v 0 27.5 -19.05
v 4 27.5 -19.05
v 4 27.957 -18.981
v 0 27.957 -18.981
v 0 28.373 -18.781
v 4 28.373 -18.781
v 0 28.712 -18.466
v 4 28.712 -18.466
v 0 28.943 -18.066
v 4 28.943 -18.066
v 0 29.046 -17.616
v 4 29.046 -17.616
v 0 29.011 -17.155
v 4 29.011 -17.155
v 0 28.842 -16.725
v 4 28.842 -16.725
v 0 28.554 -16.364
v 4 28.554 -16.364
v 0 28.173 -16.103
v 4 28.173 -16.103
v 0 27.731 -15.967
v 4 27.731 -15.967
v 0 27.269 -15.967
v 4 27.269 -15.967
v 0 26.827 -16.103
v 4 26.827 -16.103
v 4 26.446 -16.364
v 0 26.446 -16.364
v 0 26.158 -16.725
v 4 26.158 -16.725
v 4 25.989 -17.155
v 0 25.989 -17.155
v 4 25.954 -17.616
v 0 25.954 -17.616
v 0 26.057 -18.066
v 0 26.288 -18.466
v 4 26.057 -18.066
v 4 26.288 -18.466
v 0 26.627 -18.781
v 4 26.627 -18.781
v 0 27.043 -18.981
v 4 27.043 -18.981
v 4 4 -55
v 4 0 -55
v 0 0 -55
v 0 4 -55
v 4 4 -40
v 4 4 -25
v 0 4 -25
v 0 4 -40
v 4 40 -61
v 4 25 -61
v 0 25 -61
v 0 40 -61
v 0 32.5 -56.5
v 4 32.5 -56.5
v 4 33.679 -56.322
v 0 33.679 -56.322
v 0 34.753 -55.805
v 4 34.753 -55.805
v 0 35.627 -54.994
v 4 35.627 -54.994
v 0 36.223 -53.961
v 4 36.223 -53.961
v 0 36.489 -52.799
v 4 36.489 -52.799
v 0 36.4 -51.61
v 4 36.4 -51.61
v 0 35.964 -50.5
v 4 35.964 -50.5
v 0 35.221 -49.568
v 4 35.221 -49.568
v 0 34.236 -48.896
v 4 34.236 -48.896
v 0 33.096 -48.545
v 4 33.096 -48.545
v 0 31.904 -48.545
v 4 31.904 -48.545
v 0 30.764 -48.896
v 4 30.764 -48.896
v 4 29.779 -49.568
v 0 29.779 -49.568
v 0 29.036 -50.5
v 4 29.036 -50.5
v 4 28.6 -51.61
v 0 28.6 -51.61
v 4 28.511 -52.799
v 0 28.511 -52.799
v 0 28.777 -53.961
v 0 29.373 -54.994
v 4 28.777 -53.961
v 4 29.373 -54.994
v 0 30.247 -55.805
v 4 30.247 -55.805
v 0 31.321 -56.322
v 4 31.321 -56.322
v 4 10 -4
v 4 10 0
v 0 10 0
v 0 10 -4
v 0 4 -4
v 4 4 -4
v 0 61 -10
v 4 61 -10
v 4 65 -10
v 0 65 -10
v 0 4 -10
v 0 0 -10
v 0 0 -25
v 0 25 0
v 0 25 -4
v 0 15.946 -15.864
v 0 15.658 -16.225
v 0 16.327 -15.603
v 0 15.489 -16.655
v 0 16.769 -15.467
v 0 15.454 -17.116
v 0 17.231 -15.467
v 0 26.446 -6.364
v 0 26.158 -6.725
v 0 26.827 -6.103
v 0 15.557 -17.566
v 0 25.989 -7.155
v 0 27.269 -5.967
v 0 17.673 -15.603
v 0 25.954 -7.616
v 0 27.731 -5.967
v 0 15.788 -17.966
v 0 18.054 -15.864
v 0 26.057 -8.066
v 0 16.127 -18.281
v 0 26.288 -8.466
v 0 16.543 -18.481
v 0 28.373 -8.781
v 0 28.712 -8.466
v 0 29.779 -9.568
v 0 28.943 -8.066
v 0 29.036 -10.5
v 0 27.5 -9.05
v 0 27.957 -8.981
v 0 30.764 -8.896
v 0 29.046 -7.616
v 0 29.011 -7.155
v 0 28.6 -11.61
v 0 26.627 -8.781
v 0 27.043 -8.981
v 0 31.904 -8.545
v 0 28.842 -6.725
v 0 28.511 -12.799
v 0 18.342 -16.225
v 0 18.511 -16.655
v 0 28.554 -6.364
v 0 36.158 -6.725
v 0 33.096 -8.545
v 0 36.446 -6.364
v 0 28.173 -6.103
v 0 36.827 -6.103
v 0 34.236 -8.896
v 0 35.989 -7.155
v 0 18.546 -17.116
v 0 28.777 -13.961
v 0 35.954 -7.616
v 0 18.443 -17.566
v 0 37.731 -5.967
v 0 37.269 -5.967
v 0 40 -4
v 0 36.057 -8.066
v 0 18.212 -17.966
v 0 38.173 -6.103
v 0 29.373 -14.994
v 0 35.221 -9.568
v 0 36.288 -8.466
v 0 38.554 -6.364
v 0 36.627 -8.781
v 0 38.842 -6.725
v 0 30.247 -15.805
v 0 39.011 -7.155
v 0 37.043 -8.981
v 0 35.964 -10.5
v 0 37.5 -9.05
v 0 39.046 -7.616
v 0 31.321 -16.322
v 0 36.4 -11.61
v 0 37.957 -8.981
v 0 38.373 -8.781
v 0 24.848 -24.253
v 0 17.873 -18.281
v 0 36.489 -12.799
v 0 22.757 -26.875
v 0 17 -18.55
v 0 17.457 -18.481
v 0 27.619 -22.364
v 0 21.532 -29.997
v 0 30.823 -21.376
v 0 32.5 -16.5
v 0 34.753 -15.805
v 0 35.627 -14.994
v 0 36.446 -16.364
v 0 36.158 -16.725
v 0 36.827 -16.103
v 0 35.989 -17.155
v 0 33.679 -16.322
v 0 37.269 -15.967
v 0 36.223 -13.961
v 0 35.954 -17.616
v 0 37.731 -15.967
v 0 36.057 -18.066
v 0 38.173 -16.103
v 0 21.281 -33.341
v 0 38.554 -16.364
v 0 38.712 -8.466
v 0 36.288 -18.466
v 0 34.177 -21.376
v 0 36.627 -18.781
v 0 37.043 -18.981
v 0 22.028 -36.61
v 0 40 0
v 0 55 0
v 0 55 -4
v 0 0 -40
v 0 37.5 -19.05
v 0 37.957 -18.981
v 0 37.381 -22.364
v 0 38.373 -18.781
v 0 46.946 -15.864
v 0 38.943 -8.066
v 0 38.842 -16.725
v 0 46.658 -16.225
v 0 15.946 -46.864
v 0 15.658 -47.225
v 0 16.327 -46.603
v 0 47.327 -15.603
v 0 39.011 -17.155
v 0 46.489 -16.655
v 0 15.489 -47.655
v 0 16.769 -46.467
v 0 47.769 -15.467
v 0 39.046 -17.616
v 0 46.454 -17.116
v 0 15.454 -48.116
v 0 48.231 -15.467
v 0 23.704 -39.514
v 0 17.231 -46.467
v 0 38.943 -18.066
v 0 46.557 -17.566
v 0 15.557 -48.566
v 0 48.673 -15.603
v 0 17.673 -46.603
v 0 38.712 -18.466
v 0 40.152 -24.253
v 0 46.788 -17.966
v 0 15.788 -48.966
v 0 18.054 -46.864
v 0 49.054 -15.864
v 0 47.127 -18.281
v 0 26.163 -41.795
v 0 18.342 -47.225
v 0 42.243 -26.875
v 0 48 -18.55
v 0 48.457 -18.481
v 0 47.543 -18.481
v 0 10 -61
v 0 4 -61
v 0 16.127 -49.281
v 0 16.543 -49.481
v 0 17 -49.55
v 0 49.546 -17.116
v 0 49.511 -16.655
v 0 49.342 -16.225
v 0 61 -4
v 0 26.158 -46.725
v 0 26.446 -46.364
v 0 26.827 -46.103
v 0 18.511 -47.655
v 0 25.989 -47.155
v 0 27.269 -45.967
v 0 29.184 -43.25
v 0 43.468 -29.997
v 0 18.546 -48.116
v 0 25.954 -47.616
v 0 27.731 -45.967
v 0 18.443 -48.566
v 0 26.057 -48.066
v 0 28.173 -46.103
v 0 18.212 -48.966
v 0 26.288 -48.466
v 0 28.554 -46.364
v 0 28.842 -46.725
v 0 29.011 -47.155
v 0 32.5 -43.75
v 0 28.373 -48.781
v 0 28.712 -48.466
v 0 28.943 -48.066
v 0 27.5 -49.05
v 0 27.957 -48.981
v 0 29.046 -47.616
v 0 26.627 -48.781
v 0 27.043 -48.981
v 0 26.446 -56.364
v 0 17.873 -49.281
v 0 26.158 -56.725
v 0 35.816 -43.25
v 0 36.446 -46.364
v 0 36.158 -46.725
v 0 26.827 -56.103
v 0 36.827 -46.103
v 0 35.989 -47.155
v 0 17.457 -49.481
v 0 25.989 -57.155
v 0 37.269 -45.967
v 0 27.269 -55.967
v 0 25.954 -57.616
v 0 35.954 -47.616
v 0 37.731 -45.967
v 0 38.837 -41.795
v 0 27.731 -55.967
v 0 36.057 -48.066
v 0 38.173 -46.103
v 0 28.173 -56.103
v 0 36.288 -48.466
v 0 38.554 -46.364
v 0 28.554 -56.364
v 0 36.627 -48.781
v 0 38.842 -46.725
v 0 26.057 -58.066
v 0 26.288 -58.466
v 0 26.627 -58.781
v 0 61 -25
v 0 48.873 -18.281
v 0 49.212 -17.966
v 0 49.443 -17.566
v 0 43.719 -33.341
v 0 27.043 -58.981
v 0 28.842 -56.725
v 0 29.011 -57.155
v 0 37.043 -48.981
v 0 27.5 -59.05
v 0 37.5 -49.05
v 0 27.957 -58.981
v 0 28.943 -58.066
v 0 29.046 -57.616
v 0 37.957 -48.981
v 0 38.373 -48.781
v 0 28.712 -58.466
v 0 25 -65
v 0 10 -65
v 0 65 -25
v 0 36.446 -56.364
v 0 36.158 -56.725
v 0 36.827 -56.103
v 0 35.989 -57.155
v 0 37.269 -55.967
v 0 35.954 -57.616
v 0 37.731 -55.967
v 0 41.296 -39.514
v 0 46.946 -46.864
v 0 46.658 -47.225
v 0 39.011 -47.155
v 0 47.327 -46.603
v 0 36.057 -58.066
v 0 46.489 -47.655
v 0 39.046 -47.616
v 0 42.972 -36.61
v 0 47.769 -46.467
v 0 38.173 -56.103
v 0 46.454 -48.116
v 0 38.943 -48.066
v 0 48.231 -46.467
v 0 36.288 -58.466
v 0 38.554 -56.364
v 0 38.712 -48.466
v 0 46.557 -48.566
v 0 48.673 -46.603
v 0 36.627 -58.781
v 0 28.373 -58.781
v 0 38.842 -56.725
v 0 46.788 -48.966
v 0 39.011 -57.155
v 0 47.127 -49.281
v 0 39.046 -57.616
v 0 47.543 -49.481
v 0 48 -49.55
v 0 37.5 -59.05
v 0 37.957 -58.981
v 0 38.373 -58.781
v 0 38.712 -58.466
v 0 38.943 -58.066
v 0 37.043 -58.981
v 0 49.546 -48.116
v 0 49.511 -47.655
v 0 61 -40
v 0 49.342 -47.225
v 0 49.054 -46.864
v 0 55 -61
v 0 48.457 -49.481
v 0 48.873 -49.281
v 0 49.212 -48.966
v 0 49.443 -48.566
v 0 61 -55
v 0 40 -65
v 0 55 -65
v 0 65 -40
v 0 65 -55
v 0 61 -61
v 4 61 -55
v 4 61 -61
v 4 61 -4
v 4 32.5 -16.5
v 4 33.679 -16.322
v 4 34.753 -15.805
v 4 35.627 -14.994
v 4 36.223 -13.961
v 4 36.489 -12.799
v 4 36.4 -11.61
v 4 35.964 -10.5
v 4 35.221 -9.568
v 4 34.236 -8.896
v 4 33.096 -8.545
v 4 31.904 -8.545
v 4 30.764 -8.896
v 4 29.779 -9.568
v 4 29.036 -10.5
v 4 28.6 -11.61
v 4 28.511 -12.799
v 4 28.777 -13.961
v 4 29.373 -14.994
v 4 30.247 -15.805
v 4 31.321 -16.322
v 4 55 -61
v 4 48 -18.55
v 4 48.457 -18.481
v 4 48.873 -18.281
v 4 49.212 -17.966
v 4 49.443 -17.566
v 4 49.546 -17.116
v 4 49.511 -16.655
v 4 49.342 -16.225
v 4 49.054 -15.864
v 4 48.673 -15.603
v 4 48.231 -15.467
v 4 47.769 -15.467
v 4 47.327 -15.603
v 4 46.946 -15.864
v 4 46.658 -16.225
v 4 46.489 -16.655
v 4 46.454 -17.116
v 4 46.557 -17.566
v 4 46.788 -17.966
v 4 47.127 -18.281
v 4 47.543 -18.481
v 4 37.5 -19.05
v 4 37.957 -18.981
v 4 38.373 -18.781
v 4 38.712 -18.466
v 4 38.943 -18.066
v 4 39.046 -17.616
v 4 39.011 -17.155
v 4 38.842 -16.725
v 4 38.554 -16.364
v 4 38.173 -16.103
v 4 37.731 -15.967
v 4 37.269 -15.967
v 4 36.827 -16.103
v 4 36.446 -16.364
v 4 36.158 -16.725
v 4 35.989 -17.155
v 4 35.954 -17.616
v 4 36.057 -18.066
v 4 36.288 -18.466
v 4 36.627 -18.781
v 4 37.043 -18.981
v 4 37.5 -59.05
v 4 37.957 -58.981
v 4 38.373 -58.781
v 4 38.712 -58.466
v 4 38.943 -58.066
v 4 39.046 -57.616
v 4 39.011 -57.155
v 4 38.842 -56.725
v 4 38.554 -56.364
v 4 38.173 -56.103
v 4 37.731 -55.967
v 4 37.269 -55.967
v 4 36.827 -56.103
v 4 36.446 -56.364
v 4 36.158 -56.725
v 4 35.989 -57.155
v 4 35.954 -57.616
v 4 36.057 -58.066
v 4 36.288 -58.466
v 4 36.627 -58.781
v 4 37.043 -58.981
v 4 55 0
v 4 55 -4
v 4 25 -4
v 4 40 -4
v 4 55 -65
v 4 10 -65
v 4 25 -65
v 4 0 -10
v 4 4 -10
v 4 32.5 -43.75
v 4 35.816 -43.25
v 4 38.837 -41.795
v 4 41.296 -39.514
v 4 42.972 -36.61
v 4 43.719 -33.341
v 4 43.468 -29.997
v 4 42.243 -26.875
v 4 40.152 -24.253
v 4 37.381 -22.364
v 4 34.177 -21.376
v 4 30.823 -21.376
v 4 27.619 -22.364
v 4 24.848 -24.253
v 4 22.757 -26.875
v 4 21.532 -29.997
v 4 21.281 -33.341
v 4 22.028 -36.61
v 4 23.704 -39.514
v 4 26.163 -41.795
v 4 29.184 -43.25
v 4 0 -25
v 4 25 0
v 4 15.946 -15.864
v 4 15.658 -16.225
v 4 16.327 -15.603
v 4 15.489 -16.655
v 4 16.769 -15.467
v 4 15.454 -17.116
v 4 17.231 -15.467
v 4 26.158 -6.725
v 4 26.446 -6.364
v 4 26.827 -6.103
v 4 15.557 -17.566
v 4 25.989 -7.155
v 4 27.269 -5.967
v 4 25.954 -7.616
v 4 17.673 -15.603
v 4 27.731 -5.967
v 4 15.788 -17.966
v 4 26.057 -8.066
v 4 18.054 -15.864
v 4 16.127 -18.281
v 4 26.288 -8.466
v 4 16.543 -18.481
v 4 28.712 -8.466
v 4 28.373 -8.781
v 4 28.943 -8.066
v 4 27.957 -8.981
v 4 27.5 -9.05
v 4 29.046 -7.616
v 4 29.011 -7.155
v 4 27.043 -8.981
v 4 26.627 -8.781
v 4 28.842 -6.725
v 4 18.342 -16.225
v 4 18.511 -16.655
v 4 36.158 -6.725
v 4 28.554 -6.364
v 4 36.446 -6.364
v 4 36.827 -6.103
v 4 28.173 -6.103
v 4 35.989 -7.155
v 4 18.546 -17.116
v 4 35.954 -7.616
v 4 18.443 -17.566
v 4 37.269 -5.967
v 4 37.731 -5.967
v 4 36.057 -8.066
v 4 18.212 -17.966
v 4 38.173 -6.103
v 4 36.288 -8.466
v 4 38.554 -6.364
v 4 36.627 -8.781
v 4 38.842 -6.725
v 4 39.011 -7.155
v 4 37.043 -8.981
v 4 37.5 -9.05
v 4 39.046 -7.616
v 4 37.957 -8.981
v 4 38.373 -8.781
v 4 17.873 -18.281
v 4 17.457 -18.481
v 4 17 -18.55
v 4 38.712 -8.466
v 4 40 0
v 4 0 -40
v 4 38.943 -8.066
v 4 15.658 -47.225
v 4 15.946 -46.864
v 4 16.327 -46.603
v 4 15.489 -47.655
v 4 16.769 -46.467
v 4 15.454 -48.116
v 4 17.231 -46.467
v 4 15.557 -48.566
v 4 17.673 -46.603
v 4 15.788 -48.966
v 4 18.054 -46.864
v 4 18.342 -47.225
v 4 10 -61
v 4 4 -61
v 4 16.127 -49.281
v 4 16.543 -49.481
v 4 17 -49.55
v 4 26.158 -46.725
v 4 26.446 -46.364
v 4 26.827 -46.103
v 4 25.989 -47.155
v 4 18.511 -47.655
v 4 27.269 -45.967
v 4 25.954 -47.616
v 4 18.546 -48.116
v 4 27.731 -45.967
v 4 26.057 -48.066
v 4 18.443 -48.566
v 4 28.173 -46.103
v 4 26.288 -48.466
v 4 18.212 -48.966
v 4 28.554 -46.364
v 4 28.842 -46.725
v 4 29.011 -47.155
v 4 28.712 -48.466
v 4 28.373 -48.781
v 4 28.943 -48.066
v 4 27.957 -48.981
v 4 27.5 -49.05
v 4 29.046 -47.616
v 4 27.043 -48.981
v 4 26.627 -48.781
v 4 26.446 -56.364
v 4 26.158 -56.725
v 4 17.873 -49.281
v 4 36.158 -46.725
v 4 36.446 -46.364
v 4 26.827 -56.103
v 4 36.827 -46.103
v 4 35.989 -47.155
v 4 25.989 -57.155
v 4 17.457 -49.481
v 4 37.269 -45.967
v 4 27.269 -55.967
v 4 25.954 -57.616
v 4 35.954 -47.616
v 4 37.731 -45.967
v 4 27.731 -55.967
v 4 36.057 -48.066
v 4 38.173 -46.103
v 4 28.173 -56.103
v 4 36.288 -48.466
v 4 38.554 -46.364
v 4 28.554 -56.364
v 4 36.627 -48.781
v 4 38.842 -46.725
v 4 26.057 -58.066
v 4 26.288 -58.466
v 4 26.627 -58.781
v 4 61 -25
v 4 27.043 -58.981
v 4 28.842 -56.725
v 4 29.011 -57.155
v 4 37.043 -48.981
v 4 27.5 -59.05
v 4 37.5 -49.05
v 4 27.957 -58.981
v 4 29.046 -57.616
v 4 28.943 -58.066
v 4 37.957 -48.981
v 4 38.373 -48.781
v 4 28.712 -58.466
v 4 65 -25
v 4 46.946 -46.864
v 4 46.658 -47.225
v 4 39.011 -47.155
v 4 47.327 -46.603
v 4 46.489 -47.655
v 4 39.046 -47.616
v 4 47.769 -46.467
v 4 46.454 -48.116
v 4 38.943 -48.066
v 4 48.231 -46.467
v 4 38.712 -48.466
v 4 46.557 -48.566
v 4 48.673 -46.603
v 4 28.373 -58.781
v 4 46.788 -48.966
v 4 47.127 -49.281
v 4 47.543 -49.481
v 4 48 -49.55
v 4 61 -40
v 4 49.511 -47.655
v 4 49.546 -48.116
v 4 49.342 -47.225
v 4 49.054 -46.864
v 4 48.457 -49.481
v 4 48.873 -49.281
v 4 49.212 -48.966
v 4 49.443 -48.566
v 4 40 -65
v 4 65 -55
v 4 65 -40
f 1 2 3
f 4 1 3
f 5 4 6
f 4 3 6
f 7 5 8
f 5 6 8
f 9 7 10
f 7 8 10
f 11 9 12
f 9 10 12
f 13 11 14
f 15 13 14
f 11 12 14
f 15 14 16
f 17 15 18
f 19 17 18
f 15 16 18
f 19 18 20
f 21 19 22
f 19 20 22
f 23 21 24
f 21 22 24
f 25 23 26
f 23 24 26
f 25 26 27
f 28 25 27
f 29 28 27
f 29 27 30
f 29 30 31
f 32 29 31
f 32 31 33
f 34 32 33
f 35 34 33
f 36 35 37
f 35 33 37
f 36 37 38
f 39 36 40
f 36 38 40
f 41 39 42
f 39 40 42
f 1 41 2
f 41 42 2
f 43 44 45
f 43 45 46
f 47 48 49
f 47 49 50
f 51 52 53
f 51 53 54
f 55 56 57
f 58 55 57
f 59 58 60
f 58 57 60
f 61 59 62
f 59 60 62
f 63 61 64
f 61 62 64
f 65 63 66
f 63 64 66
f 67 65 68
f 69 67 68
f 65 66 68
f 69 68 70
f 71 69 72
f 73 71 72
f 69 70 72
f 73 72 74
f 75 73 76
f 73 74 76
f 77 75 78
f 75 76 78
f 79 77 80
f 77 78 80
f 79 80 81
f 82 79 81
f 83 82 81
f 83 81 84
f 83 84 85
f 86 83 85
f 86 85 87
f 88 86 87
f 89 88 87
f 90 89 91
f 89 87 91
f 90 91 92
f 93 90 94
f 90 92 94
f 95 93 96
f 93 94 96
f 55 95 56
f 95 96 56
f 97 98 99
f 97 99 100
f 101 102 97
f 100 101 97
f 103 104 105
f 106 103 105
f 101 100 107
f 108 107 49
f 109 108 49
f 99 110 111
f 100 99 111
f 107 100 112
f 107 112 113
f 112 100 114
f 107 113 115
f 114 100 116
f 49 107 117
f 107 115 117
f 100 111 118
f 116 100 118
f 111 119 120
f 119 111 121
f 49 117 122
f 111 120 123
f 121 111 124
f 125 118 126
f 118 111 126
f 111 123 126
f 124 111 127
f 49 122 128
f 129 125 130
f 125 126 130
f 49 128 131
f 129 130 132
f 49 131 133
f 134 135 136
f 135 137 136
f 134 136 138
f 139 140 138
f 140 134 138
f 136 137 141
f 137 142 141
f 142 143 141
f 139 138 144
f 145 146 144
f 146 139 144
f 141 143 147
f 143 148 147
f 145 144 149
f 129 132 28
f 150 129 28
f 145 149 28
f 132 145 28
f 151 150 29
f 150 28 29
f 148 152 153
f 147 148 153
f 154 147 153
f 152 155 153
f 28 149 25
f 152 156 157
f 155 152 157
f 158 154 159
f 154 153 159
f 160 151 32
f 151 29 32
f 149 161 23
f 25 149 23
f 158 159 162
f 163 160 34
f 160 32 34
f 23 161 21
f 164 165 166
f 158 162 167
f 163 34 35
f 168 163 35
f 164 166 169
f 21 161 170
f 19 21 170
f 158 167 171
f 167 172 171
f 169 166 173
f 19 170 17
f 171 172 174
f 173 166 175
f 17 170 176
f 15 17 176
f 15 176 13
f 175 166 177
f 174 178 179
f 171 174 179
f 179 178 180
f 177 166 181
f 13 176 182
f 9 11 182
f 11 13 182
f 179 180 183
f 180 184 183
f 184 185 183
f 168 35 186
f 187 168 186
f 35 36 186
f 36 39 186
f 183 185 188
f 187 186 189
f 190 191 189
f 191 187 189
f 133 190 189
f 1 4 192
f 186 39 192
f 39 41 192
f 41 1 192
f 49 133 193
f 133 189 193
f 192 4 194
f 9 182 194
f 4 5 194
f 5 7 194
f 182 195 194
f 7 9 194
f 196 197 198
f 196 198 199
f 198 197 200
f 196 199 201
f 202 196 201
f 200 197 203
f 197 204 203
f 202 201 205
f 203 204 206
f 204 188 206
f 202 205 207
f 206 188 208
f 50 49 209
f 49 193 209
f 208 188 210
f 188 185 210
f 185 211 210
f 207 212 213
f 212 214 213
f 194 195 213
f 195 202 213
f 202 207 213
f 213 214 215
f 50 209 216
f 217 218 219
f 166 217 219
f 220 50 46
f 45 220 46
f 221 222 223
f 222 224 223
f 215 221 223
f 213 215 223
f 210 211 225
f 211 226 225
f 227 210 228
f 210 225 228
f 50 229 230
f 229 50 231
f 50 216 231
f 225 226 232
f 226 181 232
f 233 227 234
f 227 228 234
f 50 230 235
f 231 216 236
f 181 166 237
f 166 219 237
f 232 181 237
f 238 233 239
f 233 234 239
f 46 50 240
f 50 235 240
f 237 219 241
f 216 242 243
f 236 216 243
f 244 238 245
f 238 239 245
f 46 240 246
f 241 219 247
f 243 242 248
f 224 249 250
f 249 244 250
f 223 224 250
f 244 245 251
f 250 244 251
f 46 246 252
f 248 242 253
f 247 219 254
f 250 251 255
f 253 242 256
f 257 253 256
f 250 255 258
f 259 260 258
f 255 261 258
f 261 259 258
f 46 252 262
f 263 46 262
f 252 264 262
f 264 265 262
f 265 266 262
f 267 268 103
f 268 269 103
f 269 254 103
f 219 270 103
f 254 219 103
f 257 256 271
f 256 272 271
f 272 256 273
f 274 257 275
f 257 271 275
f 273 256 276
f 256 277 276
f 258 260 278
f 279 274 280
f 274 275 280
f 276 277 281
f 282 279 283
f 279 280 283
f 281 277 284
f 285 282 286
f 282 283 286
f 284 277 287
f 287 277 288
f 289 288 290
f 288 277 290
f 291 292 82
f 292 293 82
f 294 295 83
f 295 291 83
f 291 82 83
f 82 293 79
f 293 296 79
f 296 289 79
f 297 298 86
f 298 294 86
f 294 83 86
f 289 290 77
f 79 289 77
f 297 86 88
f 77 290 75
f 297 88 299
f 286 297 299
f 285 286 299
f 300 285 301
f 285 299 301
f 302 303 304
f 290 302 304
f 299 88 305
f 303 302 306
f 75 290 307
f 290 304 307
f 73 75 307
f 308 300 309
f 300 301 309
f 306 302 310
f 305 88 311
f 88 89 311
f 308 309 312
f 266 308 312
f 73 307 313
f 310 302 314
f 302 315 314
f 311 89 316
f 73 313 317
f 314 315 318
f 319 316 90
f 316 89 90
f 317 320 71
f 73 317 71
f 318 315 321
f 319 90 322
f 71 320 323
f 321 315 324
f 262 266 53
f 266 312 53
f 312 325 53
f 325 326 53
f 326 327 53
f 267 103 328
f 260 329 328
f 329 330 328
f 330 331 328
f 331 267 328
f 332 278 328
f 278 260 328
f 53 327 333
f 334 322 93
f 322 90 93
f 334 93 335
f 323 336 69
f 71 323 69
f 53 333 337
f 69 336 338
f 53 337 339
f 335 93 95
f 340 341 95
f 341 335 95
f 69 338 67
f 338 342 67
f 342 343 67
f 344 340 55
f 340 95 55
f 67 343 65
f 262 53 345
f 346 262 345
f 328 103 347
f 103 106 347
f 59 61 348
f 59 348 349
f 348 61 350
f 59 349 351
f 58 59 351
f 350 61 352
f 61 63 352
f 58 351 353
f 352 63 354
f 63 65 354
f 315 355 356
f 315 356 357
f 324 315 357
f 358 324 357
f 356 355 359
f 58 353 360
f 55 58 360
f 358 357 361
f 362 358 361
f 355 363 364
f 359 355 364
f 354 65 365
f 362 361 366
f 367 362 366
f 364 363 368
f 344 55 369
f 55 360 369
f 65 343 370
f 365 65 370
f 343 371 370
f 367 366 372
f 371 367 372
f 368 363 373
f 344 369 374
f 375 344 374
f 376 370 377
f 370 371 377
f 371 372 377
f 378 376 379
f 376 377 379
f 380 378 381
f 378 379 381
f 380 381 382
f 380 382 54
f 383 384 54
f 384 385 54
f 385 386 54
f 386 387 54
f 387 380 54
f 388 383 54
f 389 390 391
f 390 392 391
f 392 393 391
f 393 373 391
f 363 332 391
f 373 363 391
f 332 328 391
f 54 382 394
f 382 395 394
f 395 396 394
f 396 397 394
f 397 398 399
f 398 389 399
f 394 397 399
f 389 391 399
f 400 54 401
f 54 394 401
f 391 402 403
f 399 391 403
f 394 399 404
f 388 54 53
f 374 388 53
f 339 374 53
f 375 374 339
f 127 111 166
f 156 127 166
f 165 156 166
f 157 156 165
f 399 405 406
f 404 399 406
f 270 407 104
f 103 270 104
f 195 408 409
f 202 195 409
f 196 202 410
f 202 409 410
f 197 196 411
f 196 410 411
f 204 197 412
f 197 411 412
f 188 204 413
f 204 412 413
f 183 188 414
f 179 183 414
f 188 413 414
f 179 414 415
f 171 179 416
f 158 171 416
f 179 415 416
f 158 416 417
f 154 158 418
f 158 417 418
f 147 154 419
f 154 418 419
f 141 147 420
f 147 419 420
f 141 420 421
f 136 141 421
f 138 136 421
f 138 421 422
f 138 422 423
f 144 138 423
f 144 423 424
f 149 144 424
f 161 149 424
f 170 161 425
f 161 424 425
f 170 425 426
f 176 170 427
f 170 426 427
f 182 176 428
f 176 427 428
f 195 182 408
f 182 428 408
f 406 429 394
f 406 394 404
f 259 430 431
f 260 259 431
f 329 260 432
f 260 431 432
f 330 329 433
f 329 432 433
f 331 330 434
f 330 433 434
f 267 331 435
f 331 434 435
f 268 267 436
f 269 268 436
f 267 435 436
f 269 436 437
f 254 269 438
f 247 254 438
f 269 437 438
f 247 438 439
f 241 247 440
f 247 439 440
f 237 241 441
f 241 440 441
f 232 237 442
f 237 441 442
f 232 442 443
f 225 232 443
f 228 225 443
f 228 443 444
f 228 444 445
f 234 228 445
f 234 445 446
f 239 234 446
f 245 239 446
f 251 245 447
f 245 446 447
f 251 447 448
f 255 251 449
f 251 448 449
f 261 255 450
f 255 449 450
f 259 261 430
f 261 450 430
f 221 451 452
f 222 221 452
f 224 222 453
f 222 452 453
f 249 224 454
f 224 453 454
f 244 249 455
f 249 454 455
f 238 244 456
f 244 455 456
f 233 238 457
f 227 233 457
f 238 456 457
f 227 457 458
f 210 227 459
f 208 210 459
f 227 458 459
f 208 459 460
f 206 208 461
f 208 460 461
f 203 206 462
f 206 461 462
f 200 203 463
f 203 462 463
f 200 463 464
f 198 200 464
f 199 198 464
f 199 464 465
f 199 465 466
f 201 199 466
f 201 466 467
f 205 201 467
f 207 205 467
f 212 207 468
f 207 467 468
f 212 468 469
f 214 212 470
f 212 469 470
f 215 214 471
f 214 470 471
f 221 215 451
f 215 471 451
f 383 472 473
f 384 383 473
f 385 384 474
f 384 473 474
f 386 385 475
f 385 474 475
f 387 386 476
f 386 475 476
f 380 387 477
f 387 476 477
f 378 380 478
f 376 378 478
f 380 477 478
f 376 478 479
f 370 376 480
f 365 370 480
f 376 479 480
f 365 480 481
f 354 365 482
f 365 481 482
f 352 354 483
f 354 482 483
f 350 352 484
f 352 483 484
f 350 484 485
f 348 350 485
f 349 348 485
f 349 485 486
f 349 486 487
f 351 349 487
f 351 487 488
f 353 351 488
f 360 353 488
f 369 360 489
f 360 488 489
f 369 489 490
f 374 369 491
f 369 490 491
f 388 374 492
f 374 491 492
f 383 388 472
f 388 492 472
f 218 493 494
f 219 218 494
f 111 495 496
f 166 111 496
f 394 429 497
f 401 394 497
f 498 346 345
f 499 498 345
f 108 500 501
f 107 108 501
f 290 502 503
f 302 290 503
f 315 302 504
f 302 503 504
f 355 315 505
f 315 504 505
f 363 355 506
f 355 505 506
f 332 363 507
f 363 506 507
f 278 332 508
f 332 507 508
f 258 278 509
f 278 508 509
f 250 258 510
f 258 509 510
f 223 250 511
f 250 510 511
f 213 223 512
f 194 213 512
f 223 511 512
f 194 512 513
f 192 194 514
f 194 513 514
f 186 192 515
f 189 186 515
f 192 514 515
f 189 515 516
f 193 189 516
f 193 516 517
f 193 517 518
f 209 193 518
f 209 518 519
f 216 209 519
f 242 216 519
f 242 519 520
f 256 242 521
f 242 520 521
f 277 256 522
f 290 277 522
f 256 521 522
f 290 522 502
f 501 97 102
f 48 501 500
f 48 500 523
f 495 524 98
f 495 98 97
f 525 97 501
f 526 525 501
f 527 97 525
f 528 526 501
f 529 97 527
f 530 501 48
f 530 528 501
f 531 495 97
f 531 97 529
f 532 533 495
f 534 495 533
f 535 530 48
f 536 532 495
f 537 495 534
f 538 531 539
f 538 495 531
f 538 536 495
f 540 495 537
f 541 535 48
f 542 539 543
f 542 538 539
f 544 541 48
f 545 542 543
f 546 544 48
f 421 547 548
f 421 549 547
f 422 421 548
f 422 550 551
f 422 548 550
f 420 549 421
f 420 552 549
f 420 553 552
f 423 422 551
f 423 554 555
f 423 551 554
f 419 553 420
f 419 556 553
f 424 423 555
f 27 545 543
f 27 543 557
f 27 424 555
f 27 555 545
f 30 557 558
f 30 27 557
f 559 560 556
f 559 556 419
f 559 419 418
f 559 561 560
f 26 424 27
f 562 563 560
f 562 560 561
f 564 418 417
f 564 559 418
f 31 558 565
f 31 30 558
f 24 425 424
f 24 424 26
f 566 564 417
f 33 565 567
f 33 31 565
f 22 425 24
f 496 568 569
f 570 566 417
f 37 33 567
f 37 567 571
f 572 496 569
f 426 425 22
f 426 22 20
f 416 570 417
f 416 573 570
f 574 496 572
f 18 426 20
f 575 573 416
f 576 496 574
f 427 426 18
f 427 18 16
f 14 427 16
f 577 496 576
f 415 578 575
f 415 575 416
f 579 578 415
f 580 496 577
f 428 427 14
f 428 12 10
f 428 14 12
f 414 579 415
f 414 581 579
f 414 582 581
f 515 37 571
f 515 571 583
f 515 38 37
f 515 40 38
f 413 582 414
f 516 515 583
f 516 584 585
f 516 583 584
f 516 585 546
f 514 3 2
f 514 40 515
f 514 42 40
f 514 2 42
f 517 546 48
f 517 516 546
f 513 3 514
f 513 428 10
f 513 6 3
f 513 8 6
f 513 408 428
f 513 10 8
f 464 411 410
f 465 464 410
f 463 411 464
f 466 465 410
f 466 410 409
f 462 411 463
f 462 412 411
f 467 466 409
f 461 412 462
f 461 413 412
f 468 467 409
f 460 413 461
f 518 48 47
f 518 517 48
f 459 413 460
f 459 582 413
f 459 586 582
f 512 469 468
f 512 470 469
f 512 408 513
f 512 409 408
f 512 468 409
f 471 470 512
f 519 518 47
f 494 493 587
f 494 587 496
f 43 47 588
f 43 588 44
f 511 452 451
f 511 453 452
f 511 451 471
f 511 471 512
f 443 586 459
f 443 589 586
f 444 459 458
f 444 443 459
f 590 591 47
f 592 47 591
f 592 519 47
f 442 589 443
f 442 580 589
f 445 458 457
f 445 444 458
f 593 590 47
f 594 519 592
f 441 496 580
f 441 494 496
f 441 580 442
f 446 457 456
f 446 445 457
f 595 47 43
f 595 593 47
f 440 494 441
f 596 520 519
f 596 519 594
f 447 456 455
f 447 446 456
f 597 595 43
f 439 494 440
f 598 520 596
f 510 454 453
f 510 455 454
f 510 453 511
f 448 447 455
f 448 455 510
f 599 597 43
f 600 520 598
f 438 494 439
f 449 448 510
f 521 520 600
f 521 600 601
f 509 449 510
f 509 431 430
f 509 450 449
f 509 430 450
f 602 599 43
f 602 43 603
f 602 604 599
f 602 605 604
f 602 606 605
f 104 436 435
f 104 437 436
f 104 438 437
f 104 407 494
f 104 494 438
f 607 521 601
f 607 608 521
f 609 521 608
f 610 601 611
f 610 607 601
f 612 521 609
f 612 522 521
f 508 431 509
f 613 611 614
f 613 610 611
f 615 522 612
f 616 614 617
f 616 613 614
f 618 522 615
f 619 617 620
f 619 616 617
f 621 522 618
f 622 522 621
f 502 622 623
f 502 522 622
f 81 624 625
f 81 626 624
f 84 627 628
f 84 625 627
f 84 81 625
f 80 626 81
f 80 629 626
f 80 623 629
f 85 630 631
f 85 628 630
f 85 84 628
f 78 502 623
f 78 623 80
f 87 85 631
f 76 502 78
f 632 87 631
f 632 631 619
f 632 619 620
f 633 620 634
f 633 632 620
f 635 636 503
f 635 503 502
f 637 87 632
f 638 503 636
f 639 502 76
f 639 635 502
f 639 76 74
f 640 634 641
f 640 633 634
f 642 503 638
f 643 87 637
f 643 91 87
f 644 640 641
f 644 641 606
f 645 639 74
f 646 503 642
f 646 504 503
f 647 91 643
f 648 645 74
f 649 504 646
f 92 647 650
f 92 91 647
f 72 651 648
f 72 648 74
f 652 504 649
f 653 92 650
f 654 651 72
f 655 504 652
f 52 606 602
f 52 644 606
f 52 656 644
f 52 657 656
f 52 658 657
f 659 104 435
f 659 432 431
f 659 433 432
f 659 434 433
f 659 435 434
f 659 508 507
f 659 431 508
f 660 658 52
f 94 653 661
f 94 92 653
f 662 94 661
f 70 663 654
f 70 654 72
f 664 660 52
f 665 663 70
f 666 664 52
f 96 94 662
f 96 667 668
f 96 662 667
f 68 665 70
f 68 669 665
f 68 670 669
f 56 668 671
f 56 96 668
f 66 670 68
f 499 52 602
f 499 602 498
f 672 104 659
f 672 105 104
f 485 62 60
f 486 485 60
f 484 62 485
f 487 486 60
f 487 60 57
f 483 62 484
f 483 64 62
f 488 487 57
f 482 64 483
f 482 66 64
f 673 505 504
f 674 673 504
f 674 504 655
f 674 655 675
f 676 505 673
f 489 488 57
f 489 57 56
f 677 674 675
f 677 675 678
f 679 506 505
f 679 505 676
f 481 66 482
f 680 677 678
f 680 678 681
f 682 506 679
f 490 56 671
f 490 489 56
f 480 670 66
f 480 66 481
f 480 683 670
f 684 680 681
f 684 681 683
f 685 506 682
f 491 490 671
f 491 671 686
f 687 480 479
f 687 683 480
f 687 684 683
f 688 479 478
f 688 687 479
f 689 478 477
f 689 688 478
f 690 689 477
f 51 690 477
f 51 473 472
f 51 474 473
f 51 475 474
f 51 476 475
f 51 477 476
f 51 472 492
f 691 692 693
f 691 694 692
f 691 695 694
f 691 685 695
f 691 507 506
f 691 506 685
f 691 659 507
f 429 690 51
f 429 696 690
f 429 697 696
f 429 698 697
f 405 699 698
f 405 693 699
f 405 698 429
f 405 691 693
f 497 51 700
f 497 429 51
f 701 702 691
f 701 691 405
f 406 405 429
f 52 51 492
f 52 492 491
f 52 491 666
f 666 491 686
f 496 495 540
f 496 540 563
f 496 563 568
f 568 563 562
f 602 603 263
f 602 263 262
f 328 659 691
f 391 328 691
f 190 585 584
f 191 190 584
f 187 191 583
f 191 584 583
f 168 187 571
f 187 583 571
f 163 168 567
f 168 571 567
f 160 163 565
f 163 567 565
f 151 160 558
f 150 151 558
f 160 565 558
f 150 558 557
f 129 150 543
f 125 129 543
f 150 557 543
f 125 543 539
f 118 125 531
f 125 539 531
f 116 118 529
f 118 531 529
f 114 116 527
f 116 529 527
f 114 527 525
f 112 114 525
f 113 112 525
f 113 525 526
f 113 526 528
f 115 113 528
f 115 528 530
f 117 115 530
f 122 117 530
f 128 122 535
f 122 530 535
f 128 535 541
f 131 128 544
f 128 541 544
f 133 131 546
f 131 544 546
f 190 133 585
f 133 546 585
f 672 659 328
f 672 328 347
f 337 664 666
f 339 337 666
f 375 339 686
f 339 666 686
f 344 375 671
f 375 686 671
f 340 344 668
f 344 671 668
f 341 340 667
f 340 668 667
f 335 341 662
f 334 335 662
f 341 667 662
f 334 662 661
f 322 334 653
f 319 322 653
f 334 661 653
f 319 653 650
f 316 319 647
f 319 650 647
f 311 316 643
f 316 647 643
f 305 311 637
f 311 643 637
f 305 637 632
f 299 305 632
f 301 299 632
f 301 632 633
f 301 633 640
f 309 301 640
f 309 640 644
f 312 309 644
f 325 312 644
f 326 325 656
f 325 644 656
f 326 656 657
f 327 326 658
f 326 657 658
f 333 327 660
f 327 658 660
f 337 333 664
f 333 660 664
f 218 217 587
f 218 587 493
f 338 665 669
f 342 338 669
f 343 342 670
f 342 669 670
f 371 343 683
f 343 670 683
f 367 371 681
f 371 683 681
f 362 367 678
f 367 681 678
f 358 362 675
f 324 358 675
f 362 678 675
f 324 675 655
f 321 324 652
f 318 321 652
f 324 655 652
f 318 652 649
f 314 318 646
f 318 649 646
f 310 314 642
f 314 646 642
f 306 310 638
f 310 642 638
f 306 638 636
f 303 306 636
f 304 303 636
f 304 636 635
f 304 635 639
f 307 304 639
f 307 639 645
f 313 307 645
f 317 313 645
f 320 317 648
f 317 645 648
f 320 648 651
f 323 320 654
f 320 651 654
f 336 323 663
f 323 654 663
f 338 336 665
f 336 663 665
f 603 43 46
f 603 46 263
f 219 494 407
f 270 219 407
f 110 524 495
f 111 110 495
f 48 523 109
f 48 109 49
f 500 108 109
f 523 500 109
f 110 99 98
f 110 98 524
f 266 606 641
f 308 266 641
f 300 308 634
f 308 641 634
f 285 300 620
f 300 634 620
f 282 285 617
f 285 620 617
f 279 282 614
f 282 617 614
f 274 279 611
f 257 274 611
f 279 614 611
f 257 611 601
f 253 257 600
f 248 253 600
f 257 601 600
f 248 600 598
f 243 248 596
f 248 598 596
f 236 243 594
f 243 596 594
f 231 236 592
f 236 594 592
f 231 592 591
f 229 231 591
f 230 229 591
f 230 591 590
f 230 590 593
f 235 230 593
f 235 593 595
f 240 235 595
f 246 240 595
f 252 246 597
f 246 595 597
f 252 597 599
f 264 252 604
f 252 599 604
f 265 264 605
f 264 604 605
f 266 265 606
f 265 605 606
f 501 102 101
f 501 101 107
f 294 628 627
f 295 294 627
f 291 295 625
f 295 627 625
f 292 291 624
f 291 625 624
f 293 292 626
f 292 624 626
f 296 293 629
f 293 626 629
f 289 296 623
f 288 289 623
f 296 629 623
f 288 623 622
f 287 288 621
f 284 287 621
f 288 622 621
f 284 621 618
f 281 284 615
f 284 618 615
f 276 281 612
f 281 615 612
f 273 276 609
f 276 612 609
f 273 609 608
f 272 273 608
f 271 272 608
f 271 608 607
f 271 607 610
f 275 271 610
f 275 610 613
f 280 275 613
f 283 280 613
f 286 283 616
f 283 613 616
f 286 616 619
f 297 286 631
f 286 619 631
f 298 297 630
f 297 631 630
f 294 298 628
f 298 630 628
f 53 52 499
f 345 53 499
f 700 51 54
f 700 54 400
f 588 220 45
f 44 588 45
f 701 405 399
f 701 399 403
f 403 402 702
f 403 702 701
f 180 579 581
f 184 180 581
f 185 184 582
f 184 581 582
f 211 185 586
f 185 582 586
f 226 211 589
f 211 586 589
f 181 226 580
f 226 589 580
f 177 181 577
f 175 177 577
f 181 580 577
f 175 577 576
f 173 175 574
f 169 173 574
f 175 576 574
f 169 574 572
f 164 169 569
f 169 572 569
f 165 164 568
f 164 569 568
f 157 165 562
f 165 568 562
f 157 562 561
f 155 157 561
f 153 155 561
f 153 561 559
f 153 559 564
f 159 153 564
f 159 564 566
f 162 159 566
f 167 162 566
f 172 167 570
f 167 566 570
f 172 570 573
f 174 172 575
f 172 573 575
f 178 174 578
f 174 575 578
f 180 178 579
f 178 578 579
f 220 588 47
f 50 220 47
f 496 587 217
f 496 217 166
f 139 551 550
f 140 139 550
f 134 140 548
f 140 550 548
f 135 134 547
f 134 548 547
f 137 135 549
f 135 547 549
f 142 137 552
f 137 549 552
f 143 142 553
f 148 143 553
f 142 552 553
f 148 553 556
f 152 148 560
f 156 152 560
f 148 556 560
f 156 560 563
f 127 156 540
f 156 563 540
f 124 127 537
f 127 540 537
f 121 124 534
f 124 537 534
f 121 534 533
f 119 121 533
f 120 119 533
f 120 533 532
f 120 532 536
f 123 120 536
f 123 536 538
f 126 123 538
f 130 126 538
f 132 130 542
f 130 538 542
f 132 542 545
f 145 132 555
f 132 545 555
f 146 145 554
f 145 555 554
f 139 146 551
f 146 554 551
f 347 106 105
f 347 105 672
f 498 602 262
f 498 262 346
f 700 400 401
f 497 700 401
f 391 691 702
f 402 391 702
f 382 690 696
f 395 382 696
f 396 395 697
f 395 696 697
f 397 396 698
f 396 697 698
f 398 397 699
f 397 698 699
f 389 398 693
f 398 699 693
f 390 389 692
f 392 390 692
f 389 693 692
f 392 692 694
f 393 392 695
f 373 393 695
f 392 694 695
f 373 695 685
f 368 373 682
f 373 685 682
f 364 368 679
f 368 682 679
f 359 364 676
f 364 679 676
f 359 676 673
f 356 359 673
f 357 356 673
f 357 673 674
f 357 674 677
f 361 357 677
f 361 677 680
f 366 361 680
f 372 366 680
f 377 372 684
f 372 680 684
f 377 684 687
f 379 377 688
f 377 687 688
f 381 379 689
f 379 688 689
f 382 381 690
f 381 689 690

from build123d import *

# Parameters (mm, degrees)
SKETCH1_W           = 65
SKETCH1_H           = 65
BOSS_EXTRUDE1_DEPTH = 4
SKETCH2_R           = 1.55
SKETCH2_R_2         = 11.25
CUT_EXTRUDE1_DEPTH  = 4
SKETCH3_W           = 10
SKETCH3_H           = 4
SKETCH3_W_2         = 15
CUT_EXTRUDE2_DEPTH  = 4
SKETCH5_W           = 4
SKETCH5_H           = 6
SKETCH5_H_2         = 15
CUT_EXTRUDE3_DEPTH  = 4
SKETCH6_R           = 1.55
SKETCH6_R_2         = 4
CUT_EXTRUDE4_DEPTH  = 4


with BuildPart() as part:
    # Sketch1 → Boss-Extrude1 (new body)
    with BuildSketch(Plane(origin=(0, 0, 0), x_dir=(0, 0, -1), z_dir=(1, 0, 0))):
        with Locations((32.5, 32.5)):
            Rectangle(SKETCH1_W, SKETCH1_H)
    extrude(amount=BOSS_EXTRUDE1_DEPTH)

    # Sketch2 → Cut-Extrude1 (cut)
    with BuildSketch(Plane(origin=(4, 0, 0), x_dir=(0, 0, -1), z_dir=(1, 0, 0))):
        with Locations((17, 48)):
            Circle(SKETCH2_R)
        with Locations((32.5, 32.5)):
            Circle(SKETCH2_R_2)
        with Locations((48, 48)):
            Circle(SKETCH2_R)
        with Locations((48, 17)):
            Circle(SKETCH2_R)
        with Locations((17, 17)):
            Circle(SKETCH2_R)
    extrude(amount=-CUT_EXTRUDE1_DEPTH, mode=Mode.SUBTRACT)

    # Sketch3 → Cut-Extrude2 (cut)
    with BuildSketch(Plane(origin=(4, 0, 0), x_dir=(0, 0, -1), z_dir=(1, 0, 0))):
        with Locations((5, 63)):
            Rectangle(SKETCH3_W, SKETCH3_H)
        with Locations((32.5, 63)):
            Rectangle(SKETCH3_W_2, SKETCH3_H)
        with Locations((60, 63)):
            Rectangle(SKETCH3_W, SKETCH3_H)
        with Locations((60, 2)):
            Rectangle(SKETCH3_W, SKETCH3_H)
        with Locations((32.5, 2)):
            Rectangle(SKETCH3_W_2, SKETCH3_H)
        with Locations((5, 2)):
            Rectangle(SKETCH3_W, SKETCH3_H)
    extrude(amount=-CUT_EXTRUDE2_DEPTH, mode=Mode.SUBTRACT)

    # Sketch5 → Cut-Extrude3 (cut)
    with BuildSketch(Plane(origin=(4, 0, 0), x_dir=(0, 0, -1), z_dir=(1, 0, 0))):
        with Locations((2, 58)):
            Rectangle(SKETCH5_W, SKETCH5_H)
        with Locations((2, 32.5)):
            Rectangle(SKETCH5_W, SKETCH5_H_2)
        with Locations((2, 7)):
            Rectangle(SKETCH5_W, SKETCH5_H)
        with Locations((63, 7)):
            Rectangle(SKETCH5_W, SKETCH5_H)
        with Locations((63, 32.5)):
            Rectangle(SKETCH5_W, SKETCH5_H_2)
        with Locations((63, 58)):
            Rectangle(SKETCH5_W, SKETCH5_H)
    extrude(amount=-CUT_EXTRUDE3_DEPTH, mode=Mode.SUBTRACT)

    # Sketch6 → Cut-Extrude4 (cut)
    with BuildSketch(Plane(origin=(4, 0, 0), x_dir=(0, 0, -1), z_dir=(1, 0, 0))):
        with Locations((7.5, 37.5)):
            Circle(SKETCH6_R)
        with Locations((17.5, 37.5)):
            Circle(SKETCH6_R)
        with Locations((17.5, 27.5)):
            Circle(SKETCH6_R)
        with Locations((12.5, 32.5)):
            Circle(SKETCH6_R_2)
        with Locations((7.5, 27.5)):
            Circle(SKETCH6_R)
        with Locations((52.5, 32.5)):
            Circle(SKETCH6_R_2)
        with Locations((47.5, 27.5)):
            Circle(SKETCH6_R)
        with Locations((47.5, 37.5)):
            Circle(SKETCH6_R)
        with Locations((57.5, 37.5)):
            Circle(SKETCH6_R)
        with Locations((57.5, 27.5)):
            Circle(SKETCH6_R)
    extrude(amount=-CUT_EXTRUDE4_DEPTH, mode=Mode.SUBTRACT)


solid = part.part
